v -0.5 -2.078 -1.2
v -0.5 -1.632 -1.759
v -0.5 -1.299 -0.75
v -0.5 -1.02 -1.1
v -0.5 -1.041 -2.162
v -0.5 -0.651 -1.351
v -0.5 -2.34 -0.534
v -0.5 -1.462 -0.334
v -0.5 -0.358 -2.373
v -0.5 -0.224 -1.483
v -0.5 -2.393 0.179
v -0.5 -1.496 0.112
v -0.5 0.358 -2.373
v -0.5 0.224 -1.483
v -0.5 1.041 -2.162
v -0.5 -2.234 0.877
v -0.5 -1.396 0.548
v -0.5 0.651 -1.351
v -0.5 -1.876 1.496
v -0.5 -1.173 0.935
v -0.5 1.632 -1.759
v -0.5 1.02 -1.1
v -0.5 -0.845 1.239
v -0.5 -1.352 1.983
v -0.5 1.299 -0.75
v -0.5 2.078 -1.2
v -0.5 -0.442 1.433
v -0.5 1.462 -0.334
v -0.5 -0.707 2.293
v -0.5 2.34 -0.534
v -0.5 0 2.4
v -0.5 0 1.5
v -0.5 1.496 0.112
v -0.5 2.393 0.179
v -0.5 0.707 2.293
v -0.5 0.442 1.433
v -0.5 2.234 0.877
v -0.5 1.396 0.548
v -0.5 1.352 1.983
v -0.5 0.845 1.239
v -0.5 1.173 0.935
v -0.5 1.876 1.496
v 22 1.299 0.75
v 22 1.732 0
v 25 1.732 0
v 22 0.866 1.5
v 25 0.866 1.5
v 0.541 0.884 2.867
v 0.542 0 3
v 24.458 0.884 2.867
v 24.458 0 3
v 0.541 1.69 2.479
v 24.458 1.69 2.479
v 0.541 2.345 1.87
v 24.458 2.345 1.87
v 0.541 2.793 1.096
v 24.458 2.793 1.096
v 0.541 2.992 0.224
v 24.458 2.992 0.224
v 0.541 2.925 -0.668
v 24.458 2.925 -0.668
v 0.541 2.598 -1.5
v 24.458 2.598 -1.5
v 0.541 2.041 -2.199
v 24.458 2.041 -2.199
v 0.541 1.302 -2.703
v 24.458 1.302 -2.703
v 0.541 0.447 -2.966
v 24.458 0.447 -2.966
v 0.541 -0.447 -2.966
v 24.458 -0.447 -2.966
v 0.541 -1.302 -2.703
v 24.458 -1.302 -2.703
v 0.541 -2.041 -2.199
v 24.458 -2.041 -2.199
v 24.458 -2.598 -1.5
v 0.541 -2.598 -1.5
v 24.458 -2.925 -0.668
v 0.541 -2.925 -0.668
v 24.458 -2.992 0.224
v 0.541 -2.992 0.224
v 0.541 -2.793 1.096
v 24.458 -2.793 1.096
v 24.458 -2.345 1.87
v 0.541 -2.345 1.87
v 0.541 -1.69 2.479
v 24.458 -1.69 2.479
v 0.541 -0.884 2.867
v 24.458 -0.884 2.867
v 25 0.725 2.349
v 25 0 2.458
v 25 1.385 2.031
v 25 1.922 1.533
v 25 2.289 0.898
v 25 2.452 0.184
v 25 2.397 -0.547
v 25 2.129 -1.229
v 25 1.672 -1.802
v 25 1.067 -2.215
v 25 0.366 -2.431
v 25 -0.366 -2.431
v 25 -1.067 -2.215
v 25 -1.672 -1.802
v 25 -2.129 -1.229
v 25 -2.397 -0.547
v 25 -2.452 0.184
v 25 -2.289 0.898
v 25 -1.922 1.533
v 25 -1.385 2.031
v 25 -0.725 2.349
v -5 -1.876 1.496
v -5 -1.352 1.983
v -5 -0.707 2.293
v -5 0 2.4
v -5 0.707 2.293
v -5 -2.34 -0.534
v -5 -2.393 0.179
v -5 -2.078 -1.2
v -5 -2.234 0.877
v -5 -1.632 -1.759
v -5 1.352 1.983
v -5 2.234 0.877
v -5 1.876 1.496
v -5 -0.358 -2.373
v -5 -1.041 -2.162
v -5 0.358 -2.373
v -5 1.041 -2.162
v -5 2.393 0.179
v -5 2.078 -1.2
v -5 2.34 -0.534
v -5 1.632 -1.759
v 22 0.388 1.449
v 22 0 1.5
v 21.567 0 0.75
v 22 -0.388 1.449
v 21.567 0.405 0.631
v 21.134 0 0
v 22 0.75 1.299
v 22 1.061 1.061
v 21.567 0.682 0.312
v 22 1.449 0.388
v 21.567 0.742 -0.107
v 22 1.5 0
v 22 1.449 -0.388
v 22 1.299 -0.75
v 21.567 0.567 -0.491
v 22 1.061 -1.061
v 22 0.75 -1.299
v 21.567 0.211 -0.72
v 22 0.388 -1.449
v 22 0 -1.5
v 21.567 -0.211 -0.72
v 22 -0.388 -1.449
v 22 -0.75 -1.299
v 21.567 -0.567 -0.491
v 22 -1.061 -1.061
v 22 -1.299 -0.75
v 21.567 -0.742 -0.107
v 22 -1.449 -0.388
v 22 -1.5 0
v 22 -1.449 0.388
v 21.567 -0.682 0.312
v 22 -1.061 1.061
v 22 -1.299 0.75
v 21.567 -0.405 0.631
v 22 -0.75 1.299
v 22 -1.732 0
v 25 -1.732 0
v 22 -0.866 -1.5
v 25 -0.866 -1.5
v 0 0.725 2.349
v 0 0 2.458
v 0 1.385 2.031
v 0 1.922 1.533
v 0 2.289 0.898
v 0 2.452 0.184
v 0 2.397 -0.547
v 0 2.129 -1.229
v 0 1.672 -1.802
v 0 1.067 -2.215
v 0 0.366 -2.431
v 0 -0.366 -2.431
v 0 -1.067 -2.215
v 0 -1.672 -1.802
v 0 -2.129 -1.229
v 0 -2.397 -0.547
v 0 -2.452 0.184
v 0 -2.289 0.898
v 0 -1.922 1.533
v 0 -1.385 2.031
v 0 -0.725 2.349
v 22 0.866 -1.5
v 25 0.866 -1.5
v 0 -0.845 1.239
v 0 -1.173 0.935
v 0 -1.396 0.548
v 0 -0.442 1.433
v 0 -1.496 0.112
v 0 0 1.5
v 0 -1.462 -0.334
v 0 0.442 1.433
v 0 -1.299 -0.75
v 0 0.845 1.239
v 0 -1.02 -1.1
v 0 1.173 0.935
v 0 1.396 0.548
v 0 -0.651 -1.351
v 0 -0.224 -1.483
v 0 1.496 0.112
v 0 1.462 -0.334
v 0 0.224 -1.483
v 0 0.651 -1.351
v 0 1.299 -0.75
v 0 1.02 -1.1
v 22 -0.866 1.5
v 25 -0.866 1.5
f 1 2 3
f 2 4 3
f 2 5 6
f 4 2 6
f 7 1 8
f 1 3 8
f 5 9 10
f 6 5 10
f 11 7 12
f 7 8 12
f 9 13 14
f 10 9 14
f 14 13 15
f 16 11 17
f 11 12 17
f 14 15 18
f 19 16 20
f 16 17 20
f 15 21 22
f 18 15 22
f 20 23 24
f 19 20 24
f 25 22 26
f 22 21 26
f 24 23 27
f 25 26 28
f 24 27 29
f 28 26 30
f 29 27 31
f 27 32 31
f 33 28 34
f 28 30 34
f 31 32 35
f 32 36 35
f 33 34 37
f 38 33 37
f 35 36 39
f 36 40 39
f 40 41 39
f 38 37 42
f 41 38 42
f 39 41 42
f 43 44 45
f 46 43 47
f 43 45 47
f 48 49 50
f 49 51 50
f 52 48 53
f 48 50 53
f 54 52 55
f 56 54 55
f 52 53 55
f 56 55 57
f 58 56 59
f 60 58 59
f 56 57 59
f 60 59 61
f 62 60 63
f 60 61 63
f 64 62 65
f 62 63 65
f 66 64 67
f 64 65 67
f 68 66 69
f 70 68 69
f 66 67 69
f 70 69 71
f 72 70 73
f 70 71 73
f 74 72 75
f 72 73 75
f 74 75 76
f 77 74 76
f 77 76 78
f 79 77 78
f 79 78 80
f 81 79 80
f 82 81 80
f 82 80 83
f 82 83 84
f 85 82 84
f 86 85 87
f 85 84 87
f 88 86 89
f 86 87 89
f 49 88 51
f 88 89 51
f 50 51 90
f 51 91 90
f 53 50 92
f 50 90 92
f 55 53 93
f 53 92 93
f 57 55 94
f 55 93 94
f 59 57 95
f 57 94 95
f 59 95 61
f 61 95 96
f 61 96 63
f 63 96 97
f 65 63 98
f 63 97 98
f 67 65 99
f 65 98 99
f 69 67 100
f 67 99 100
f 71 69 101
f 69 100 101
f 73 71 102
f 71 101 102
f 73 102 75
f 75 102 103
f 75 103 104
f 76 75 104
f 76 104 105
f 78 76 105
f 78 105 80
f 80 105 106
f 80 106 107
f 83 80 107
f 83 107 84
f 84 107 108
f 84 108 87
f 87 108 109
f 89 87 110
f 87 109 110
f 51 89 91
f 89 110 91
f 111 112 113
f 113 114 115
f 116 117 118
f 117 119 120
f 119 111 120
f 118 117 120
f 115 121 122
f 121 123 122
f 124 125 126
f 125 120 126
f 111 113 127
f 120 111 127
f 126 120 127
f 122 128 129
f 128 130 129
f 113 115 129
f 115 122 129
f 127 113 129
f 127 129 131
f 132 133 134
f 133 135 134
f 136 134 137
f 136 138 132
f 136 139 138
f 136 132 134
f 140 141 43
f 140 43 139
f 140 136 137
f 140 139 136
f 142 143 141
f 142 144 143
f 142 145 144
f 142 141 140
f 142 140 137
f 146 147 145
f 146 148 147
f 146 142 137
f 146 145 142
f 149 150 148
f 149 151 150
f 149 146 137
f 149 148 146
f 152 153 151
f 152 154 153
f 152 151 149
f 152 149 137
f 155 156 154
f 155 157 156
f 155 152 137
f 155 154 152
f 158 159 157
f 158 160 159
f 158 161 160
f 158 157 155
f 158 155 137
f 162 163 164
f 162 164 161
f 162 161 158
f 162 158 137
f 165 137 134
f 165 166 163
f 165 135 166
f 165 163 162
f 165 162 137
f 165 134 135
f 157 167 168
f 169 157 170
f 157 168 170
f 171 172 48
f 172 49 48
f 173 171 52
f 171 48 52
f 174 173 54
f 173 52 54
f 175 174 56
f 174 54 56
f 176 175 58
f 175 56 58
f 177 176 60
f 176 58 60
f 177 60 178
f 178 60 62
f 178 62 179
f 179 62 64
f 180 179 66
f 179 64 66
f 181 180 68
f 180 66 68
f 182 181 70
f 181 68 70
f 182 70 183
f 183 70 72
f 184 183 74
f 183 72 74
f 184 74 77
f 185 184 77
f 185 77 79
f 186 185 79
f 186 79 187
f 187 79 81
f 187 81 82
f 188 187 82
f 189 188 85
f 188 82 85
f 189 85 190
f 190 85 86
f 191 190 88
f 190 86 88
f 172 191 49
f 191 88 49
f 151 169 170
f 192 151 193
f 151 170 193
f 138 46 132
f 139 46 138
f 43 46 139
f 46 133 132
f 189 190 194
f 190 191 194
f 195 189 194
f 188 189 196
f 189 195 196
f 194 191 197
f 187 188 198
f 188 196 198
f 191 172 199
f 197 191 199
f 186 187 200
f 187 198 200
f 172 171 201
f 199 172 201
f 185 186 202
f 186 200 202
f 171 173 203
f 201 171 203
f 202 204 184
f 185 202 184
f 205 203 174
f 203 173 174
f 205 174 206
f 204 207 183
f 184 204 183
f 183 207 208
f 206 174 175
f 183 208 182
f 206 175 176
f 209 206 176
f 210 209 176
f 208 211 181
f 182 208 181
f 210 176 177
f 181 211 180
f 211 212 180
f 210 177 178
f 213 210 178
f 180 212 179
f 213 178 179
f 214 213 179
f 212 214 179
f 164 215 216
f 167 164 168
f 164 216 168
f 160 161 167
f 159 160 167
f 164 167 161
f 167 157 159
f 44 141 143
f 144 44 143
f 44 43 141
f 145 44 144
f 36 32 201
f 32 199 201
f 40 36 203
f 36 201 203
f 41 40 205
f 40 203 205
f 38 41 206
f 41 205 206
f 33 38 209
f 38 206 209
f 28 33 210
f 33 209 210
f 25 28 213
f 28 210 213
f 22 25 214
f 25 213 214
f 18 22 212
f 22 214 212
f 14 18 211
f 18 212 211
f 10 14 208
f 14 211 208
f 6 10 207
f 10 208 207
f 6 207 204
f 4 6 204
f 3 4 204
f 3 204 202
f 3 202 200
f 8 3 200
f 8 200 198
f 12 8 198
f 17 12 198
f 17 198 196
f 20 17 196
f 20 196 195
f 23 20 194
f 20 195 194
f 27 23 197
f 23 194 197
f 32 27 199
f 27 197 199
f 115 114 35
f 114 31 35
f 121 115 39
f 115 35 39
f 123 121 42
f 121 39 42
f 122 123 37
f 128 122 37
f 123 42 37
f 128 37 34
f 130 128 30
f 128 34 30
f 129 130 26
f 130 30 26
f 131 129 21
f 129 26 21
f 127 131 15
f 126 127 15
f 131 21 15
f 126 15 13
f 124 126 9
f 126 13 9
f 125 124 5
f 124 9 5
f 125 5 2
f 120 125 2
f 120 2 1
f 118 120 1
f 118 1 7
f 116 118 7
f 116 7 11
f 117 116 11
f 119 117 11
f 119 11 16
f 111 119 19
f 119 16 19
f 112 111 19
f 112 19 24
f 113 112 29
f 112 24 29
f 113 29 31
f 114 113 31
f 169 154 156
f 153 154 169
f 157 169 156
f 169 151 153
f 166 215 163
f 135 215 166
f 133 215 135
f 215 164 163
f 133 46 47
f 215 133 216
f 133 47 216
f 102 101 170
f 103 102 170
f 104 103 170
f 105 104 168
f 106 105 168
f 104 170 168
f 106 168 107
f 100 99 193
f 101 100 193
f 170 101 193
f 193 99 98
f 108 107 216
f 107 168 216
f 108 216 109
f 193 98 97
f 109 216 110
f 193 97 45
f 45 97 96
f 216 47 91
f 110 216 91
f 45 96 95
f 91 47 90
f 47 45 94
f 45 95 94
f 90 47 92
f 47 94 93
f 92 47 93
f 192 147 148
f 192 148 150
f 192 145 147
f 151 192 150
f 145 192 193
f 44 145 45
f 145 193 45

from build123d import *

# Parameters (mm, degrees)
CUT_EXTRUDE_1_DEPTH = 3


with BuildPart() as part:
    # 草图1 → 旋转1 (revolve)
    with BuildSketch(Plane.XY):
        Polygon((-5, 0), (-5, 2.4), (-0.5, 2.4), (-0.5, 1.5), (0, 1.5), (0, 2.4585), (0.5415, 3), (24.4585, 3), (25, 2.4585), (25, 0), align=None)
    revolve(axis=Axis((25, 0, 0), (-1, 0, 0)))

    # 草图2 → 切除-旋转1 (revolve, cut)
    with BuildSketch(Plane(origin=(0, 0, 0), x_dir=(1, 0, 0), z_dir=(0, 1, 0))):
        Polygon((21.133974596, 0), (22, 1.5), (25, 1.5), (25, 0), align=None)
    revolve(axis=Axis((25, 0, 0), (-1, 0, 0)), mode=Mode.SUBTRACT)

    # 草图3 → 切除-拉伸1 (cut)
    with BuildSketch(Plane(origin=(25, 0, 0), x_dir=(0, 0, -1), z_dir=(1, 0, 0))):
        Polygon((-1.5, 0.866025404), (-1.5, -0.866025404), (0, -1.732050808), (1.5, -0.866025404), (1.5, 0.866025404), (0, 1.732050808), align=None)
    extrude(amount=-CUT_EXTRUDE_1_DEPTH, mode=Mode.SUBTRACT)


solid = part.part
